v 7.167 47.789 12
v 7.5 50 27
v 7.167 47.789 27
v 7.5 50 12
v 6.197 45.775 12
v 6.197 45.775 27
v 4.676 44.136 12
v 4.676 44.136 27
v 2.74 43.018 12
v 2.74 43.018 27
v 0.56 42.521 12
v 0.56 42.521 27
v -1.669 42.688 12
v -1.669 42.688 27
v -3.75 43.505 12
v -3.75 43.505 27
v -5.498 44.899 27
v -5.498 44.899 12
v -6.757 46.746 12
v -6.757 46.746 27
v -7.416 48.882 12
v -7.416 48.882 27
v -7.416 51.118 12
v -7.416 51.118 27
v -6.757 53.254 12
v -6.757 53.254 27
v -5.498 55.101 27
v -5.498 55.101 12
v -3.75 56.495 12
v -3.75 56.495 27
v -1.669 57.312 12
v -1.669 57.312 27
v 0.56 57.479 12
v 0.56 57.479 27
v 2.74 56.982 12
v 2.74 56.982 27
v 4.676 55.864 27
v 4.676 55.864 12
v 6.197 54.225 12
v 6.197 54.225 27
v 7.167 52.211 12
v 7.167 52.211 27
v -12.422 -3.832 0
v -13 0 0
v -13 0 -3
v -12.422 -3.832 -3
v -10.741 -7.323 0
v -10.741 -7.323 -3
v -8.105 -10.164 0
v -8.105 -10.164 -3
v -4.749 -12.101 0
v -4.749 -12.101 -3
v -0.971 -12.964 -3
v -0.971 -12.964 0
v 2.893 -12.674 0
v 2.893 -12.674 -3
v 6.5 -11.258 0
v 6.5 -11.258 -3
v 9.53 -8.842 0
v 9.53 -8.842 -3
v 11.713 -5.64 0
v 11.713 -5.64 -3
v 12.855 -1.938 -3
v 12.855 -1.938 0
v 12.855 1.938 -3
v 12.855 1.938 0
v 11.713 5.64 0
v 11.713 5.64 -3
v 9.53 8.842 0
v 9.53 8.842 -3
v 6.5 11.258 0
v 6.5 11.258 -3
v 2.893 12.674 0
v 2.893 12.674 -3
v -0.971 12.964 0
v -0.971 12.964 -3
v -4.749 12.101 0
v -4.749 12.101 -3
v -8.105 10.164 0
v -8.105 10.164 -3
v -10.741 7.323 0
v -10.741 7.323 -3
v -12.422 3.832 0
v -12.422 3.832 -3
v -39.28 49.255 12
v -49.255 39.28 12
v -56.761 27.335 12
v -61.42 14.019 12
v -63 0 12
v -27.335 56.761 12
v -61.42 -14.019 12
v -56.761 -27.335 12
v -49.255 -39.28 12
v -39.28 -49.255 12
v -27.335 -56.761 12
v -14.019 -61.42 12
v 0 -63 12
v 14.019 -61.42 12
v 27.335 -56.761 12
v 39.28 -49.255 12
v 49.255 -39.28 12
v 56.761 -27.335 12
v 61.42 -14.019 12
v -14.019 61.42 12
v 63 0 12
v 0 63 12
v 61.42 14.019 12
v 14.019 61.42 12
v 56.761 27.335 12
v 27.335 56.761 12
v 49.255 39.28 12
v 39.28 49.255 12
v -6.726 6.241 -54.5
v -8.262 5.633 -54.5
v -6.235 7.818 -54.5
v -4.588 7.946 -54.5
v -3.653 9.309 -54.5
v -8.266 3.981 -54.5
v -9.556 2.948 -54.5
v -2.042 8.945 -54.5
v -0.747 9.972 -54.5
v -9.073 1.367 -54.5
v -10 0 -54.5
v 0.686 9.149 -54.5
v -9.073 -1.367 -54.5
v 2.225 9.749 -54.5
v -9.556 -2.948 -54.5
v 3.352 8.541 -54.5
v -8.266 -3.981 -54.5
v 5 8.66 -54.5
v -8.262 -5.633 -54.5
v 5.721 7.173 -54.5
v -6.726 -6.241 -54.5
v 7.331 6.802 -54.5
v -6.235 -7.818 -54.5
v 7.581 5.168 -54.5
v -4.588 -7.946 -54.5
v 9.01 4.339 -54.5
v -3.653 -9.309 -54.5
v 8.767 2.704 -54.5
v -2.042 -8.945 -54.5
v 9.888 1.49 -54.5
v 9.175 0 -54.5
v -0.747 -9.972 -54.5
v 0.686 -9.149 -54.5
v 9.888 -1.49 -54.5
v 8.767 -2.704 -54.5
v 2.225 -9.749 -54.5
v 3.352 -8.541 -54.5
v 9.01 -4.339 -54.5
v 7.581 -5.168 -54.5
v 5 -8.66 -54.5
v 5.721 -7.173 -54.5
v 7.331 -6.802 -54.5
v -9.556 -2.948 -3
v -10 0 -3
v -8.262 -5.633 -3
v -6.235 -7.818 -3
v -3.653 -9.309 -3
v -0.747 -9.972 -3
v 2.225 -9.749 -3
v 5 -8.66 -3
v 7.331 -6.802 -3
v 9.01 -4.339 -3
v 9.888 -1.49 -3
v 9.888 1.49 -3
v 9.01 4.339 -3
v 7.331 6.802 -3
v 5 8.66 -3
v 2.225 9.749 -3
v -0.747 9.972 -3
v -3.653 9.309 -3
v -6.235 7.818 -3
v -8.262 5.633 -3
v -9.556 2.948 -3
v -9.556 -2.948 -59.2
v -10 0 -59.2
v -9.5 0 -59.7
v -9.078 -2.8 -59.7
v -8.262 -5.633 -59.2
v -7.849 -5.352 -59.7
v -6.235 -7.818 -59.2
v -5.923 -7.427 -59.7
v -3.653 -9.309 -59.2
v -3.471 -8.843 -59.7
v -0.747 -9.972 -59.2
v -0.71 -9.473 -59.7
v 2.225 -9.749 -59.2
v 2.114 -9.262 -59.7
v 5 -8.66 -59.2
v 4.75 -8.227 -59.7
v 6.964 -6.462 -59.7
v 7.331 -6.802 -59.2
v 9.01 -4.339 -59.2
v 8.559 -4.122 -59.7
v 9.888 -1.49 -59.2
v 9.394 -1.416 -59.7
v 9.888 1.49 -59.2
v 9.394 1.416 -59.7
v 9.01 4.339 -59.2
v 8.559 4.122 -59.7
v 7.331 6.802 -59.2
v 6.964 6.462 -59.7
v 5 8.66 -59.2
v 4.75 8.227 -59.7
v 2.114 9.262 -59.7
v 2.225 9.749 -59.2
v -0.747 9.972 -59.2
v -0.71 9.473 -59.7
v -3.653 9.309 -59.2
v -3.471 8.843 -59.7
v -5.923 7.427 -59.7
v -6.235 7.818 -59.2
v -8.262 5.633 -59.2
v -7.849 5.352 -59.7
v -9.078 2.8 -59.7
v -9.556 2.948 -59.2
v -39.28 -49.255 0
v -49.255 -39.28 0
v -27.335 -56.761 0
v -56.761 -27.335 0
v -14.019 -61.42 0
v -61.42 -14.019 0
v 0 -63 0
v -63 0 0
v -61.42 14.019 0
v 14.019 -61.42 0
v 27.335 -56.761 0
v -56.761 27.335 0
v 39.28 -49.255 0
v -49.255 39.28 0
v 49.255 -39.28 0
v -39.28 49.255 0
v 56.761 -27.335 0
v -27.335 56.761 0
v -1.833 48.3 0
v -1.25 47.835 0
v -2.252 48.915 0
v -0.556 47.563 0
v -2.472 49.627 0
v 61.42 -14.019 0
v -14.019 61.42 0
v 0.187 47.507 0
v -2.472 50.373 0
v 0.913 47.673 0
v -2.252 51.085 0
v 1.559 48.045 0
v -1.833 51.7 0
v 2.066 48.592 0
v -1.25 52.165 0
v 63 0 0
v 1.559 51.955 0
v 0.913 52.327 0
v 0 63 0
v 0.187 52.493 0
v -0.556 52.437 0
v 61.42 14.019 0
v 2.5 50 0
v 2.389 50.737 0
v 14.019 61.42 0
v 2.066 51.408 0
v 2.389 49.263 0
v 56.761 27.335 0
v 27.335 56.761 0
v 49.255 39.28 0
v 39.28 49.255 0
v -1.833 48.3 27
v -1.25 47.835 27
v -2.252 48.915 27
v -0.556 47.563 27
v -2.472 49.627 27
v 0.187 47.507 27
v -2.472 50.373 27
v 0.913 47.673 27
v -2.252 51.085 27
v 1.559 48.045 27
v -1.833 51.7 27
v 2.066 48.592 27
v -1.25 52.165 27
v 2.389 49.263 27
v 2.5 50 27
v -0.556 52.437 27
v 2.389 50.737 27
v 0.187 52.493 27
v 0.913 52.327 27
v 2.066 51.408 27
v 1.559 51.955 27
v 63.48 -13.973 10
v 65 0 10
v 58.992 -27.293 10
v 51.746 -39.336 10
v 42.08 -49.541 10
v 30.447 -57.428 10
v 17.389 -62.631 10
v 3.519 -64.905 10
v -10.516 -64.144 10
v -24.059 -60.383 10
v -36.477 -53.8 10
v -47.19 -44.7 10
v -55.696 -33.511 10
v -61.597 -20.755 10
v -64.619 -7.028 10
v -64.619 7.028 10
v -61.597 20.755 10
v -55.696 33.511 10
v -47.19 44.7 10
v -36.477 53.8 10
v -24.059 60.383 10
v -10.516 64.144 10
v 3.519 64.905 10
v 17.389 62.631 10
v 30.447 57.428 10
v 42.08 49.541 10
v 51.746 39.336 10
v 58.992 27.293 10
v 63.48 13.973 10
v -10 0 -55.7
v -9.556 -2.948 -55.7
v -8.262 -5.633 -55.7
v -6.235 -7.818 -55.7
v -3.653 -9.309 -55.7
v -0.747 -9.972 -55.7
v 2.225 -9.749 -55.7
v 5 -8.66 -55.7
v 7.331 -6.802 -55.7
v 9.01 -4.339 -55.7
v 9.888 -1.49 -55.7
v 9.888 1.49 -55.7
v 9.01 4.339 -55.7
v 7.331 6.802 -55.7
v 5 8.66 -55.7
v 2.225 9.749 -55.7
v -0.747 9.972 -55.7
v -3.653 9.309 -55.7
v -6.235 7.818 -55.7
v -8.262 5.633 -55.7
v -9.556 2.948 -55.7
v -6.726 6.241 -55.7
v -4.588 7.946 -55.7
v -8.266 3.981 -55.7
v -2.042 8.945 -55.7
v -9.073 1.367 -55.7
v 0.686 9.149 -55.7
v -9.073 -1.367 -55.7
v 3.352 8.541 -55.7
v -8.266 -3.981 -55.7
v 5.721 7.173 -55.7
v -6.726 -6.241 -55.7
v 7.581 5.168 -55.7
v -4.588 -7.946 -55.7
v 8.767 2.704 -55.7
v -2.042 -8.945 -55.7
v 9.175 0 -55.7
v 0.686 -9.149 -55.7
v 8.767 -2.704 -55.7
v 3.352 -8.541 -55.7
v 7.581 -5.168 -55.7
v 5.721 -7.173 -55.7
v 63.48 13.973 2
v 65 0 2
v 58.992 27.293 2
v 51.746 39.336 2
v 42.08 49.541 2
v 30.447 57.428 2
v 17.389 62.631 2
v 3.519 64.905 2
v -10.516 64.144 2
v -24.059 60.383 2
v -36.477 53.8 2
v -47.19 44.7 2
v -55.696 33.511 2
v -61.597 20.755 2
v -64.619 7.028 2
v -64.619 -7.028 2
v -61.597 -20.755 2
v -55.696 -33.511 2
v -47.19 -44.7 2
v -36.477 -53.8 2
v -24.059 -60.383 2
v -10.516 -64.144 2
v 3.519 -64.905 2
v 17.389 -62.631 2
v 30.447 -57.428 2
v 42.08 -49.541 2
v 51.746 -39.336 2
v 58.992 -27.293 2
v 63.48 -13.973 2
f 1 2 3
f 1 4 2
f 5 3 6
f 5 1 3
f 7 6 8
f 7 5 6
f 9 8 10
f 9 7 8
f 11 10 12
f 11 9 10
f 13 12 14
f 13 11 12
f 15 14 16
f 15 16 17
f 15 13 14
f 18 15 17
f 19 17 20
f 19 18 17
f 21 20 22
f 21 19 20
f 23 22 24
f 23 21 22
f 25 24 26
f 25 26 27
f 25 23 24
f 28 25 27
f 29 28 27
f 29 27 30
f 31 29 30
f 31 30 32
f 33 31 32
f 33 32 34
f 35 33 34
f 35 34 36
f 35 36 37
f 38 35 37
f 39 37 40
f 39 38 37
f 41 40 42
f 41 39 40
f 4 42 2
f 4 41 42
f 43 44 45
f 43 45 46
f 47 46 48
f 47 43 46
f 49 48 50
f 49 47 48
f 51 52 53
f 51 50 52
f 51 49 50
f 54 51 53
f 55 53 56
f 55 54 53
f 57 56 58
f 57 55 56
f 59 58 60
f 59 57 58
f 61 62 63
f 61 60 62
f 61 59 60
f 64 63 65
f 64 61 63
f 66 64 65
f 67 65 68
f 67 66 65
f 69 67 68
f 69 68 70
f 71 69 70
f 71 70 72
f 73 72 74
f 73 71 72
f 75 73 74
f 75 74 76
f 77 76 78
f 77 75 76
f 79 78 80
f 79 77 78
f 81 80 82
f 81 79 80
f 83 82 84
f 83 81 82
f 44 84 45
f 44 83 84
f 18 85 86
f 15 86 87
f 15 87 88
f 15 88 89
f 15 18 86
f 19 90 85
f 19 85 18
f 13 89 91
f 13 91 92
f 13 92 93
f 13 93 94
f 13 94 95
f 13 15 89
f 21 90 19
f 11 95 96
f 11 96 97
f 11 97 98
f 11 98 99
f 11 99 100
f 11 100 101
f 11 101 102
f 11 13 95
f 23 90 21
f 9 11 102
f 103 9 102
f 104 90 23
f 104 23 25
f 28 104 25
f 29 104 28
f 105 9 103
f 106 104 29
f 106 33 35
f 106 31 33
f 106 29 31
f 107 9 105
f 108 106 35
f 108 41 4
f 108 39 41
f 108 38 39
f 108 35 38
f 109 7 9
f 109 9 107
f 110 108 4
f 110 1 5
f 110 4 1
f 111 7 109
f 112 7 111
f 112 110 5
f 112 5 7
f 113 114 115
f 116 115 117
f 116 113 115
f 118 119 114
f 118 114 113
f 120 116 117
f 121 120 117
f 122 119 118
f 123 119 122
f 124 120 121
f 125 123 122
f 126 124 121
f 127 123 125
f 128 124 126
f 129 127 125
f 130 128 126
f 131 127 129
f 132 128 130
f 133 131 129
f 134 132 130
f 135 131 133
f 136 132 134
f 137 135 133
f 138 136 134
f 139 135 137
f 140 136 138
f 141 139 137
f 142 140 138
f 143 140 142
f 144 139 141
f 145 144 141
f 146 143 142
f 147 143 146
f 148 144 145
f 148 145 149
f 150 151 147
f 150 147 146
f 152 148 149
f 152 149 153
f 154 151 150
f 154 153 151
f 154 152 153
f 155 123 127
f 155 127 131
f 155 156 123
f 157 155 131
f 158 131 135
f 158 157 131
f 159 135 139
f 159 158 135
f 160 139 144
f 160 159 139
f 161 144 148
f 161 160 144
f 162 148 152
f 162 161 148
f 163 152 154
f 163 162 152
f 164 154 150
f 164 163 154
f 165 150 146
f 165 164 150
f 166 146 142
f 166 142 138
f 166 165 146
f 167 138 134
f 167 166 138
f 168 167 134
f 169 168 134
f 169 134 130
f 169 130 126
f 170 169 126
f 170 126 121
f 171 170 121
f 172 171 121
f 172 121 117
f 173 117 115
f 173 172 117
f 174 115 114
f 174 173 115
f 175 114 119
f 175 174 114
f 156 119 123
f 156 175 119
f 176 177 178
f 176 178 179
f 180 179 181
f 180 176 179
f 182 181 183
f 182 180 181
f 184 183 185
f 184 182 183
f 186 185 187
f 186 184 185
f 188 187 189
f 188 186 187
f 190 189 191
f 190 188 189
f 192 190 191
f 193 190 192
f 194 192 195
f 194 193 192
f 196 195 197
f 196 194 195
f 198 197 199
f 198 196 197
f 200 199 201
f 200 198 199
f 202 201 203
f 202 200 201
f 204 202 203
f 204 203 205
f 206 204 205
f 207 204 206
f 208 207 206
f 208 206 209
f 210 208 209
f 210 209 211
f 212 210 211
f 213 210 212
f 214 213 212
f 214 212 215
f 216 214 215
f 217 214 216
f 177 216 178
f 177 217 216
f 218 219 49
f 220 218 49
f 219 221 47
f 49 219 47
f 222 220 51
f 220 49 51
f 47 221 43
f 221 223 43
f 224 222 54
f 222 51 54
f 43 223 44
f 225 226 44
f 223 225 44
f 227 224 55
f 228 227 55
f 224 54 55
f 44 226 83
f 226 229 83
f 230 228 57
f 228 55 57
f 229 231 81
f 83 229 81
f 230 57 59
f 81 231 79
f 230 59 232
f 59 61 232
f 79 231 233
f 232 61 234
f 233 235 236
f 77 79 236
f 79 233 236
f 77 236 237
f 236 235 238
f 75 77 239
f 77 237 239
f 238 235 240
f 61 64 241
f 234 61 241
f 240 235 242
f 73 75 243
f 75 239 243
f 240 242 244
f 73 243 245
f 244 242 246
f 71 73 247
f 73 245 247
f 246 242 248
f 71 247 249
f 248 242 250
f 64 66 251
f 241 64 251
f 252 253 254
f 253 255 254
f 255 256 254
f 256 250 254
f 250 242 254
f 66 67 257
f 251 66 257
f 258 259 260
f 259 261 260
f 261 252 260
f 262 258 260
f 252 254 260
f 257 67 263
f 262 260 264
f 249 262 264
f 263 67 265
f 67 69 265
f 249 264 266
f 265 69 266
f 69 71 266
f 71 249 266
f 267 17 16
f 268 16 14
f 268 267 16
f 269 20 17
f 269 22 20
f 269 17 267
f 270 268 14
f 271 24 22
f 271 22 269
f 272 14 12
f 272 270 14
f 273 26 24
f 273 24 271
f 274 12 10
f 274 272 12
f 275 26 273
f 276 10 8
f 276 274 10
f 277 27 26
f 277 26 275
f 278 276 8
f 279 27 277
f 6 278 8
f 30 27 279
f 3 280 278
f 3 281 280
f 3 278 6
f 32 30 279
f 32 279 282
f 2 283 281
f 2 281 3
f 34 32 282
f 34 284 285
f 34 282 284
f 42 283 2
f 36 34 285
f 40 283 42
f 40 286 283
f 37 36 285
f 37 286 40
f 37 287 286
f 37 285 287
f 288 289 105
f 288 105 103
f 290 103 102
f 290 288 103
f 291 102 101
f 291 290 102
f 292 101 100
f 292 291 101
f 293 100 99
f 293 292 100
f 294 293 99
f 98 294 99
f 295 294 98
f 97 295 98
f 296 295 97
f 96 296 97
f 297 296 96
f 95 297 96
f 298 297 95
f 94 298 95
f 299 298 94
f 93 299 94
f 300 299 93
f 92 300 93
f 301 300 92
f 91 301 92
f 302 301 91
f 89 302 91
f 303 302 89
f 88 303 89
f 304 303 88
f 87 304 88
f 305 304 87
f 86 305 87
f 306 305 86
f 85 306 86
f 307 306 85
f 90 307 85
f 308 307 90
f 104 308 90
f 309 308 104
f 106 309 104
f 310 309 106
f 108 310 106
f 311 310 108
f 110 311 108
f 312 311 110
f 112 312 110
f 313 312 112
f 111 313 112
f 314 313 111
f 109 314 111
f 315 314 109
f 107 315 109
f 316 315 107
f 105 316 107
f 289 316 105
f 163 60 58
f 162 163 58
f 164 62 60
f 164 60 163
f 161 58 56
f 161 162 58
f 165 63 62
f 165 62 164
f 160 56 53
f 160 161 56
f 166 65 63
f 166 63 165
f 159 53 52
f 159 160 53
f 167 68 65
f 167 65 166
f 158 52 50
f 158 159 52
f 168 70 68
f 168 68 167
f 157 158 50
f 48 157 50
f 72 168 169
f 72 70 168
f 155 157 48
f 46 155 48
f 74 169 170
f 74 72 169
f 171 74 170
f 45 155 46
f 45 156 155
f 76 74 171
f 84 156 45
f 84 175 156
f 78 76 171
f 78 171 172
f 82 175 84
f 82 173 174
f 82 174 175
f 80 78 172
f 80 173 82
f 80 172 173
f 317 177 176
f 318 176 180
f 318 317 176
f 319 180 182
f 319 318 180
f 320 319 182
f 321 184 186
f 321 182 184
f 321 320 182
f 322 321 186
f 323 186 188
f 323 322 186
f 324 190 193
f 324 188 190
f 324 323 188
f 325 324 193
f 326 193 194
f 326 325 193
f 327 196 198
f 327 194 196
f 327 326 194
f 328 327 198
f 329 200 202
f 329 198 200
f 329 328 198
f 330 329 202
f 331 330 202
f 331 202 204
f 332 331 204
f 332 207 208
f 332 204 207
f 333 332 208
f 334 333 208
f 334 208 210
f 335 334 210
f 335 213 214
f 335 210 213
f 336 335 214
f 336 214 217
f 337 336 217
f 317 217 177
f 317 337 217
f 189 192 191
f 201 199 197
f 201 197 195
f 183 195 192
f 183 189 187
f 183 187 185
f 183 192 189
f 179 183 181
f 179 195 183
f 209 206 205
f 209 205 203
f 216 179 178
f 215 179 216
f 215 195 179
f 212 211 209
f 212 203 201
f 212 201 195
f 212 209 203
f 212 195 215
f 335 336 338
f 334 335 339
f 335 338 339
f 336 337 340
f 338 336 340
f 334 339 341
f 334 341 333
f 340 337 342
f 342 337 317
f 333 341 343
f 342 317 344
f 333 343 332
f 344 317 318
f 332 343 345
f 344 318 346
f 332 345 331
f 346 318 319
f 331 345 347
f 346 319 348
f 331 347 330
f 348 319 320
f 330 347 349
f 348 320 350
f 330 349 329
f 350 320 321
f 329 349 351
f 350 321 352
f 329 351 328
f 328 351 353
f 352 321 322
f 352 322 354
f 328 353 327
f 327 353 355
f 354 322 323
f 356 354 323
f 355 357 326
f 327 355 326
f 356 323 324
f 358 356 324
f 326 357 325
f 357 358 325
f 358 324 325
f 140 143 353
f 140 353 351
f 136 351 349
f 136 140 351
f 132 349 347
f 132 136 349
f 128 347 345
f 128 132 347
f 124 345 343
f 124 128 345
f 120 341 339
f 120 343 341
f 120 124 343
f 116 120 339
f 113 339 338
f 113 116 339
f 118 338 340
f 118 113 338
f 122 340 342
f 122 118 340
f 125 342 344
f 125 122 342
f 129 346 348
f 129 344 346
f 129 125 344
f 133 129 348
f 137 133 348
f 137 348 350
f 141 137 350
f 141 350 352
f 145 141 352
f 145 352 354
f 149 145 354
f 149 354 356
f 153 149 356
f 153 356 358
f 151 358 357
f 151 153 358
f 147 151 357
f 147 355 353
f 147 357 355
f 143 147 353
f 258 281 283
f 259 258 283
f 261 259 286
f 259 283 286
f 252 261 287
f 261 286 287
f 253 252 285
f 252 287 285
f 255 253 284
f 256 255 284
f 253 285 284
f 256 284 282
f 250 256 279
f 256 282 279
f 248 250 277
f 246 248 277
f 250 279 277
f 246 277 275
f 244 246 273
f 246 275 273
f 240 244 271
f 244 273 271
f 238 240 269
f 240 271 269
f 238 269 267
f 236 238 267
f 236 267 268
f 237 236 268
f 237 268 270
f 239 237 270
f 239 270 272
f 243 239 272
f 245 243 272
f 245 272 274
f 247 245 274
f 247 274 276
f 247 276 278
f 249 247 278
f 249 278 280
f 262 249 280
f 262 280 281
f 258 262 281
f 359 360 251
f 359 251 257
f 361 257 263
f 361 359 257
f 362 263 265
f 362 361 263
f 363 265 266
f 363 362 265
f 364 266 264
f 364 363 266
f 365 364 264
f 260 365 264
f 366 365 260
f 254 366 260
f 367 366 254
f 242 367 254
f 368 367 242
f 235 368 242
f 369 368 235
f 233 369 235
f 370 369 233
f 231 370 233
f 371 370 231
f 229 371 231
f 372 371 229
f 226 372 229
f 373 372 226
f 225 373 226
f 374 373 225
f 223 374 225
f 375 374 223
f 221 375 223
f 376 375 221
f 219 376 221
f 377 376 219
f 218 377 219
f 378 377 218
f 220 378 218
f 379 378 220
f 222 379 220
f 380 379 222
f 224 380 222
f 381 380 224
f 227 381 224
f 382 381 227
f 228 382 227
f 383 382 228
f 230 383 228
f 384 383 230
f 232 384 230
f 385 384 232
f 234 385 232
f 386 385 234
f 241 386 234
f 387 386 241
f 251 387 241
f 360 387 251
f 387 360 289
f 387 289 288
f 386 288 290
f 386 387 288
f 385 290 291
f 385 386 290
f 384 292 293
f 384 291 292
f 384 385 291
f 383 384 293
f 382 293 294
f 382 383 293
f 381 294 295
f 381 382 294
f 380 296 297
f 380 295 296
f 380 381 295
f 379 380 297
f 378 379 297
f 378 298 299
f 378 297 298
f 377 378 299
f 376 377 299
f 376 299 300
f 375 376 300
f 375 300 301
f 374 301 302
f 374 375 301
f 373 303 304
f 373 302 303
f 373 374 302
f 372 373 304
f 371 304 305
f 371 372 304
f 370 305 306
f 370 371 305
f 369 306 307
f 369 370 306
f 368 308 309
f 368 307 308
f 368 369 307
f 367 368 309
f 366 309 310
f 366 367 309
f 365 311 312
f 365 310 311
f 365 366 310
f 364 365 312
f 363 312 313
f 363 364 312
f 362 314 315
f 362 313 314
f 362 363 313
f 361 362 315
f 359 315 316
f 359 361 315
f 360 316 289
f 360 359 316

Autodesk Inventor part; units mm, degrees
ref_plane "YZ Plane" through (0, 0, 0) normal (1, 0, 0) x (0, 1, 0)
ref_plane "XZ Plane" through (0, 0, 0) normal (0, 1, 0) x (-1, 0, 0)
ref_plane "XY Plane" through (0, 0, 0) normal (0, 0, 1) x (1, 0, 0)
sketch "草图1" plane through (0, 0, 0) normal (0, 0, 1) x (1, 0, 0)
  circle A0 centre (0, 0) radius 65
  dimension "d0" = 130
extrude "拉伸1" add sketch "草图1" along normal blind 12
sketch "草图2" plane through (0, 0, 12) normal (0, 0, 1) x (1, 0, 0)
  circle A0 centre (0, 0) radius 50
  circle A1 centre (0, 50) radius 7.5
  line L0 (0, 0) -> (0, 11.3897)
  dimension "d3" = 100
  dimension "d4" = 15
  dimension "d5" = 11.3897
extrude "拉伸2" add sketch "草图2" along normal blind 15 contours A1 A0 | A0 A1 picked at (0, 47.4583) picked at (0.2152, 52.449)
sketch "草图3" plane through (0, 50, 27) normal (0, 0, 1) x (1, 0, 0)
  circle A0 centre (0, 0) radius 2.5
  circle A1 centre (0, 0) radius 7.5 projected
  point P0 (0, -50)
  dimension "d8" = 5
extrude "拉伸3" cut sketch "草图3" against normal through all contours A0
thread "螺纹1" size "M5x0.8" class "6H" standard "ANSI Metric M Profile" full length
sketch "草图4" plane through (0, 0, 0) normal (0, 0, -1) x (-1, 0, 0)
  circle A0 centre (0, 0) radius 10
  dimension "d13" = 20
extrude "拉伸4" add sketch "草图4" along normal blind 59.7
sketch "草图5" plane through (0, 0, 0) normal (0, 0, -1) x (-1, 0, 0)
  circle A0 centre (0, 0) radius 13
  dimension "d16" = 26
extrude "拉伸5" add sketch "草图5" along normal blind 3
chamfer "倒角1" distance 2 angle 45 2 edges at (-65, 0, 0) (-65, 0, 12)
chamfer "倒角2" distance 0.5 angle 45 1 edges at (10, 0, -59.7)
sketch "草图6" plane through (0, 0, 0) normal (0, 1, 0) x (-1, 0, 0)
  line L0 (-9.175, -54.5) -> (-18.451, -54.5)
  line L1 (-18.451, -54.5) -> (-18.451, -55.7)
  line L2 (-18.451, -55.7) -> (-9.175, -55.7)
  line L3 (-9.175, -55.7) -> (-9.175, -54.5)
  line L4 (9.5, -59.7) -> (-9.5, -59.7) projected
  line L5 (0, -59.7) -> (0, -69.9932)
  point P0 (0, 0)
  dimension "d25" = 10.2932
  dimension "d26" = 4
  dimension "d27" = 1.2
  dimension "d28" = 9.175
  dimension "d29" = 9.276
revolve "旋转1" cut sketch "草图6" angle 360 about axis through (0, 0, -59.7) along (0, 0, -1)
properties part number "刀轴带动盘"
